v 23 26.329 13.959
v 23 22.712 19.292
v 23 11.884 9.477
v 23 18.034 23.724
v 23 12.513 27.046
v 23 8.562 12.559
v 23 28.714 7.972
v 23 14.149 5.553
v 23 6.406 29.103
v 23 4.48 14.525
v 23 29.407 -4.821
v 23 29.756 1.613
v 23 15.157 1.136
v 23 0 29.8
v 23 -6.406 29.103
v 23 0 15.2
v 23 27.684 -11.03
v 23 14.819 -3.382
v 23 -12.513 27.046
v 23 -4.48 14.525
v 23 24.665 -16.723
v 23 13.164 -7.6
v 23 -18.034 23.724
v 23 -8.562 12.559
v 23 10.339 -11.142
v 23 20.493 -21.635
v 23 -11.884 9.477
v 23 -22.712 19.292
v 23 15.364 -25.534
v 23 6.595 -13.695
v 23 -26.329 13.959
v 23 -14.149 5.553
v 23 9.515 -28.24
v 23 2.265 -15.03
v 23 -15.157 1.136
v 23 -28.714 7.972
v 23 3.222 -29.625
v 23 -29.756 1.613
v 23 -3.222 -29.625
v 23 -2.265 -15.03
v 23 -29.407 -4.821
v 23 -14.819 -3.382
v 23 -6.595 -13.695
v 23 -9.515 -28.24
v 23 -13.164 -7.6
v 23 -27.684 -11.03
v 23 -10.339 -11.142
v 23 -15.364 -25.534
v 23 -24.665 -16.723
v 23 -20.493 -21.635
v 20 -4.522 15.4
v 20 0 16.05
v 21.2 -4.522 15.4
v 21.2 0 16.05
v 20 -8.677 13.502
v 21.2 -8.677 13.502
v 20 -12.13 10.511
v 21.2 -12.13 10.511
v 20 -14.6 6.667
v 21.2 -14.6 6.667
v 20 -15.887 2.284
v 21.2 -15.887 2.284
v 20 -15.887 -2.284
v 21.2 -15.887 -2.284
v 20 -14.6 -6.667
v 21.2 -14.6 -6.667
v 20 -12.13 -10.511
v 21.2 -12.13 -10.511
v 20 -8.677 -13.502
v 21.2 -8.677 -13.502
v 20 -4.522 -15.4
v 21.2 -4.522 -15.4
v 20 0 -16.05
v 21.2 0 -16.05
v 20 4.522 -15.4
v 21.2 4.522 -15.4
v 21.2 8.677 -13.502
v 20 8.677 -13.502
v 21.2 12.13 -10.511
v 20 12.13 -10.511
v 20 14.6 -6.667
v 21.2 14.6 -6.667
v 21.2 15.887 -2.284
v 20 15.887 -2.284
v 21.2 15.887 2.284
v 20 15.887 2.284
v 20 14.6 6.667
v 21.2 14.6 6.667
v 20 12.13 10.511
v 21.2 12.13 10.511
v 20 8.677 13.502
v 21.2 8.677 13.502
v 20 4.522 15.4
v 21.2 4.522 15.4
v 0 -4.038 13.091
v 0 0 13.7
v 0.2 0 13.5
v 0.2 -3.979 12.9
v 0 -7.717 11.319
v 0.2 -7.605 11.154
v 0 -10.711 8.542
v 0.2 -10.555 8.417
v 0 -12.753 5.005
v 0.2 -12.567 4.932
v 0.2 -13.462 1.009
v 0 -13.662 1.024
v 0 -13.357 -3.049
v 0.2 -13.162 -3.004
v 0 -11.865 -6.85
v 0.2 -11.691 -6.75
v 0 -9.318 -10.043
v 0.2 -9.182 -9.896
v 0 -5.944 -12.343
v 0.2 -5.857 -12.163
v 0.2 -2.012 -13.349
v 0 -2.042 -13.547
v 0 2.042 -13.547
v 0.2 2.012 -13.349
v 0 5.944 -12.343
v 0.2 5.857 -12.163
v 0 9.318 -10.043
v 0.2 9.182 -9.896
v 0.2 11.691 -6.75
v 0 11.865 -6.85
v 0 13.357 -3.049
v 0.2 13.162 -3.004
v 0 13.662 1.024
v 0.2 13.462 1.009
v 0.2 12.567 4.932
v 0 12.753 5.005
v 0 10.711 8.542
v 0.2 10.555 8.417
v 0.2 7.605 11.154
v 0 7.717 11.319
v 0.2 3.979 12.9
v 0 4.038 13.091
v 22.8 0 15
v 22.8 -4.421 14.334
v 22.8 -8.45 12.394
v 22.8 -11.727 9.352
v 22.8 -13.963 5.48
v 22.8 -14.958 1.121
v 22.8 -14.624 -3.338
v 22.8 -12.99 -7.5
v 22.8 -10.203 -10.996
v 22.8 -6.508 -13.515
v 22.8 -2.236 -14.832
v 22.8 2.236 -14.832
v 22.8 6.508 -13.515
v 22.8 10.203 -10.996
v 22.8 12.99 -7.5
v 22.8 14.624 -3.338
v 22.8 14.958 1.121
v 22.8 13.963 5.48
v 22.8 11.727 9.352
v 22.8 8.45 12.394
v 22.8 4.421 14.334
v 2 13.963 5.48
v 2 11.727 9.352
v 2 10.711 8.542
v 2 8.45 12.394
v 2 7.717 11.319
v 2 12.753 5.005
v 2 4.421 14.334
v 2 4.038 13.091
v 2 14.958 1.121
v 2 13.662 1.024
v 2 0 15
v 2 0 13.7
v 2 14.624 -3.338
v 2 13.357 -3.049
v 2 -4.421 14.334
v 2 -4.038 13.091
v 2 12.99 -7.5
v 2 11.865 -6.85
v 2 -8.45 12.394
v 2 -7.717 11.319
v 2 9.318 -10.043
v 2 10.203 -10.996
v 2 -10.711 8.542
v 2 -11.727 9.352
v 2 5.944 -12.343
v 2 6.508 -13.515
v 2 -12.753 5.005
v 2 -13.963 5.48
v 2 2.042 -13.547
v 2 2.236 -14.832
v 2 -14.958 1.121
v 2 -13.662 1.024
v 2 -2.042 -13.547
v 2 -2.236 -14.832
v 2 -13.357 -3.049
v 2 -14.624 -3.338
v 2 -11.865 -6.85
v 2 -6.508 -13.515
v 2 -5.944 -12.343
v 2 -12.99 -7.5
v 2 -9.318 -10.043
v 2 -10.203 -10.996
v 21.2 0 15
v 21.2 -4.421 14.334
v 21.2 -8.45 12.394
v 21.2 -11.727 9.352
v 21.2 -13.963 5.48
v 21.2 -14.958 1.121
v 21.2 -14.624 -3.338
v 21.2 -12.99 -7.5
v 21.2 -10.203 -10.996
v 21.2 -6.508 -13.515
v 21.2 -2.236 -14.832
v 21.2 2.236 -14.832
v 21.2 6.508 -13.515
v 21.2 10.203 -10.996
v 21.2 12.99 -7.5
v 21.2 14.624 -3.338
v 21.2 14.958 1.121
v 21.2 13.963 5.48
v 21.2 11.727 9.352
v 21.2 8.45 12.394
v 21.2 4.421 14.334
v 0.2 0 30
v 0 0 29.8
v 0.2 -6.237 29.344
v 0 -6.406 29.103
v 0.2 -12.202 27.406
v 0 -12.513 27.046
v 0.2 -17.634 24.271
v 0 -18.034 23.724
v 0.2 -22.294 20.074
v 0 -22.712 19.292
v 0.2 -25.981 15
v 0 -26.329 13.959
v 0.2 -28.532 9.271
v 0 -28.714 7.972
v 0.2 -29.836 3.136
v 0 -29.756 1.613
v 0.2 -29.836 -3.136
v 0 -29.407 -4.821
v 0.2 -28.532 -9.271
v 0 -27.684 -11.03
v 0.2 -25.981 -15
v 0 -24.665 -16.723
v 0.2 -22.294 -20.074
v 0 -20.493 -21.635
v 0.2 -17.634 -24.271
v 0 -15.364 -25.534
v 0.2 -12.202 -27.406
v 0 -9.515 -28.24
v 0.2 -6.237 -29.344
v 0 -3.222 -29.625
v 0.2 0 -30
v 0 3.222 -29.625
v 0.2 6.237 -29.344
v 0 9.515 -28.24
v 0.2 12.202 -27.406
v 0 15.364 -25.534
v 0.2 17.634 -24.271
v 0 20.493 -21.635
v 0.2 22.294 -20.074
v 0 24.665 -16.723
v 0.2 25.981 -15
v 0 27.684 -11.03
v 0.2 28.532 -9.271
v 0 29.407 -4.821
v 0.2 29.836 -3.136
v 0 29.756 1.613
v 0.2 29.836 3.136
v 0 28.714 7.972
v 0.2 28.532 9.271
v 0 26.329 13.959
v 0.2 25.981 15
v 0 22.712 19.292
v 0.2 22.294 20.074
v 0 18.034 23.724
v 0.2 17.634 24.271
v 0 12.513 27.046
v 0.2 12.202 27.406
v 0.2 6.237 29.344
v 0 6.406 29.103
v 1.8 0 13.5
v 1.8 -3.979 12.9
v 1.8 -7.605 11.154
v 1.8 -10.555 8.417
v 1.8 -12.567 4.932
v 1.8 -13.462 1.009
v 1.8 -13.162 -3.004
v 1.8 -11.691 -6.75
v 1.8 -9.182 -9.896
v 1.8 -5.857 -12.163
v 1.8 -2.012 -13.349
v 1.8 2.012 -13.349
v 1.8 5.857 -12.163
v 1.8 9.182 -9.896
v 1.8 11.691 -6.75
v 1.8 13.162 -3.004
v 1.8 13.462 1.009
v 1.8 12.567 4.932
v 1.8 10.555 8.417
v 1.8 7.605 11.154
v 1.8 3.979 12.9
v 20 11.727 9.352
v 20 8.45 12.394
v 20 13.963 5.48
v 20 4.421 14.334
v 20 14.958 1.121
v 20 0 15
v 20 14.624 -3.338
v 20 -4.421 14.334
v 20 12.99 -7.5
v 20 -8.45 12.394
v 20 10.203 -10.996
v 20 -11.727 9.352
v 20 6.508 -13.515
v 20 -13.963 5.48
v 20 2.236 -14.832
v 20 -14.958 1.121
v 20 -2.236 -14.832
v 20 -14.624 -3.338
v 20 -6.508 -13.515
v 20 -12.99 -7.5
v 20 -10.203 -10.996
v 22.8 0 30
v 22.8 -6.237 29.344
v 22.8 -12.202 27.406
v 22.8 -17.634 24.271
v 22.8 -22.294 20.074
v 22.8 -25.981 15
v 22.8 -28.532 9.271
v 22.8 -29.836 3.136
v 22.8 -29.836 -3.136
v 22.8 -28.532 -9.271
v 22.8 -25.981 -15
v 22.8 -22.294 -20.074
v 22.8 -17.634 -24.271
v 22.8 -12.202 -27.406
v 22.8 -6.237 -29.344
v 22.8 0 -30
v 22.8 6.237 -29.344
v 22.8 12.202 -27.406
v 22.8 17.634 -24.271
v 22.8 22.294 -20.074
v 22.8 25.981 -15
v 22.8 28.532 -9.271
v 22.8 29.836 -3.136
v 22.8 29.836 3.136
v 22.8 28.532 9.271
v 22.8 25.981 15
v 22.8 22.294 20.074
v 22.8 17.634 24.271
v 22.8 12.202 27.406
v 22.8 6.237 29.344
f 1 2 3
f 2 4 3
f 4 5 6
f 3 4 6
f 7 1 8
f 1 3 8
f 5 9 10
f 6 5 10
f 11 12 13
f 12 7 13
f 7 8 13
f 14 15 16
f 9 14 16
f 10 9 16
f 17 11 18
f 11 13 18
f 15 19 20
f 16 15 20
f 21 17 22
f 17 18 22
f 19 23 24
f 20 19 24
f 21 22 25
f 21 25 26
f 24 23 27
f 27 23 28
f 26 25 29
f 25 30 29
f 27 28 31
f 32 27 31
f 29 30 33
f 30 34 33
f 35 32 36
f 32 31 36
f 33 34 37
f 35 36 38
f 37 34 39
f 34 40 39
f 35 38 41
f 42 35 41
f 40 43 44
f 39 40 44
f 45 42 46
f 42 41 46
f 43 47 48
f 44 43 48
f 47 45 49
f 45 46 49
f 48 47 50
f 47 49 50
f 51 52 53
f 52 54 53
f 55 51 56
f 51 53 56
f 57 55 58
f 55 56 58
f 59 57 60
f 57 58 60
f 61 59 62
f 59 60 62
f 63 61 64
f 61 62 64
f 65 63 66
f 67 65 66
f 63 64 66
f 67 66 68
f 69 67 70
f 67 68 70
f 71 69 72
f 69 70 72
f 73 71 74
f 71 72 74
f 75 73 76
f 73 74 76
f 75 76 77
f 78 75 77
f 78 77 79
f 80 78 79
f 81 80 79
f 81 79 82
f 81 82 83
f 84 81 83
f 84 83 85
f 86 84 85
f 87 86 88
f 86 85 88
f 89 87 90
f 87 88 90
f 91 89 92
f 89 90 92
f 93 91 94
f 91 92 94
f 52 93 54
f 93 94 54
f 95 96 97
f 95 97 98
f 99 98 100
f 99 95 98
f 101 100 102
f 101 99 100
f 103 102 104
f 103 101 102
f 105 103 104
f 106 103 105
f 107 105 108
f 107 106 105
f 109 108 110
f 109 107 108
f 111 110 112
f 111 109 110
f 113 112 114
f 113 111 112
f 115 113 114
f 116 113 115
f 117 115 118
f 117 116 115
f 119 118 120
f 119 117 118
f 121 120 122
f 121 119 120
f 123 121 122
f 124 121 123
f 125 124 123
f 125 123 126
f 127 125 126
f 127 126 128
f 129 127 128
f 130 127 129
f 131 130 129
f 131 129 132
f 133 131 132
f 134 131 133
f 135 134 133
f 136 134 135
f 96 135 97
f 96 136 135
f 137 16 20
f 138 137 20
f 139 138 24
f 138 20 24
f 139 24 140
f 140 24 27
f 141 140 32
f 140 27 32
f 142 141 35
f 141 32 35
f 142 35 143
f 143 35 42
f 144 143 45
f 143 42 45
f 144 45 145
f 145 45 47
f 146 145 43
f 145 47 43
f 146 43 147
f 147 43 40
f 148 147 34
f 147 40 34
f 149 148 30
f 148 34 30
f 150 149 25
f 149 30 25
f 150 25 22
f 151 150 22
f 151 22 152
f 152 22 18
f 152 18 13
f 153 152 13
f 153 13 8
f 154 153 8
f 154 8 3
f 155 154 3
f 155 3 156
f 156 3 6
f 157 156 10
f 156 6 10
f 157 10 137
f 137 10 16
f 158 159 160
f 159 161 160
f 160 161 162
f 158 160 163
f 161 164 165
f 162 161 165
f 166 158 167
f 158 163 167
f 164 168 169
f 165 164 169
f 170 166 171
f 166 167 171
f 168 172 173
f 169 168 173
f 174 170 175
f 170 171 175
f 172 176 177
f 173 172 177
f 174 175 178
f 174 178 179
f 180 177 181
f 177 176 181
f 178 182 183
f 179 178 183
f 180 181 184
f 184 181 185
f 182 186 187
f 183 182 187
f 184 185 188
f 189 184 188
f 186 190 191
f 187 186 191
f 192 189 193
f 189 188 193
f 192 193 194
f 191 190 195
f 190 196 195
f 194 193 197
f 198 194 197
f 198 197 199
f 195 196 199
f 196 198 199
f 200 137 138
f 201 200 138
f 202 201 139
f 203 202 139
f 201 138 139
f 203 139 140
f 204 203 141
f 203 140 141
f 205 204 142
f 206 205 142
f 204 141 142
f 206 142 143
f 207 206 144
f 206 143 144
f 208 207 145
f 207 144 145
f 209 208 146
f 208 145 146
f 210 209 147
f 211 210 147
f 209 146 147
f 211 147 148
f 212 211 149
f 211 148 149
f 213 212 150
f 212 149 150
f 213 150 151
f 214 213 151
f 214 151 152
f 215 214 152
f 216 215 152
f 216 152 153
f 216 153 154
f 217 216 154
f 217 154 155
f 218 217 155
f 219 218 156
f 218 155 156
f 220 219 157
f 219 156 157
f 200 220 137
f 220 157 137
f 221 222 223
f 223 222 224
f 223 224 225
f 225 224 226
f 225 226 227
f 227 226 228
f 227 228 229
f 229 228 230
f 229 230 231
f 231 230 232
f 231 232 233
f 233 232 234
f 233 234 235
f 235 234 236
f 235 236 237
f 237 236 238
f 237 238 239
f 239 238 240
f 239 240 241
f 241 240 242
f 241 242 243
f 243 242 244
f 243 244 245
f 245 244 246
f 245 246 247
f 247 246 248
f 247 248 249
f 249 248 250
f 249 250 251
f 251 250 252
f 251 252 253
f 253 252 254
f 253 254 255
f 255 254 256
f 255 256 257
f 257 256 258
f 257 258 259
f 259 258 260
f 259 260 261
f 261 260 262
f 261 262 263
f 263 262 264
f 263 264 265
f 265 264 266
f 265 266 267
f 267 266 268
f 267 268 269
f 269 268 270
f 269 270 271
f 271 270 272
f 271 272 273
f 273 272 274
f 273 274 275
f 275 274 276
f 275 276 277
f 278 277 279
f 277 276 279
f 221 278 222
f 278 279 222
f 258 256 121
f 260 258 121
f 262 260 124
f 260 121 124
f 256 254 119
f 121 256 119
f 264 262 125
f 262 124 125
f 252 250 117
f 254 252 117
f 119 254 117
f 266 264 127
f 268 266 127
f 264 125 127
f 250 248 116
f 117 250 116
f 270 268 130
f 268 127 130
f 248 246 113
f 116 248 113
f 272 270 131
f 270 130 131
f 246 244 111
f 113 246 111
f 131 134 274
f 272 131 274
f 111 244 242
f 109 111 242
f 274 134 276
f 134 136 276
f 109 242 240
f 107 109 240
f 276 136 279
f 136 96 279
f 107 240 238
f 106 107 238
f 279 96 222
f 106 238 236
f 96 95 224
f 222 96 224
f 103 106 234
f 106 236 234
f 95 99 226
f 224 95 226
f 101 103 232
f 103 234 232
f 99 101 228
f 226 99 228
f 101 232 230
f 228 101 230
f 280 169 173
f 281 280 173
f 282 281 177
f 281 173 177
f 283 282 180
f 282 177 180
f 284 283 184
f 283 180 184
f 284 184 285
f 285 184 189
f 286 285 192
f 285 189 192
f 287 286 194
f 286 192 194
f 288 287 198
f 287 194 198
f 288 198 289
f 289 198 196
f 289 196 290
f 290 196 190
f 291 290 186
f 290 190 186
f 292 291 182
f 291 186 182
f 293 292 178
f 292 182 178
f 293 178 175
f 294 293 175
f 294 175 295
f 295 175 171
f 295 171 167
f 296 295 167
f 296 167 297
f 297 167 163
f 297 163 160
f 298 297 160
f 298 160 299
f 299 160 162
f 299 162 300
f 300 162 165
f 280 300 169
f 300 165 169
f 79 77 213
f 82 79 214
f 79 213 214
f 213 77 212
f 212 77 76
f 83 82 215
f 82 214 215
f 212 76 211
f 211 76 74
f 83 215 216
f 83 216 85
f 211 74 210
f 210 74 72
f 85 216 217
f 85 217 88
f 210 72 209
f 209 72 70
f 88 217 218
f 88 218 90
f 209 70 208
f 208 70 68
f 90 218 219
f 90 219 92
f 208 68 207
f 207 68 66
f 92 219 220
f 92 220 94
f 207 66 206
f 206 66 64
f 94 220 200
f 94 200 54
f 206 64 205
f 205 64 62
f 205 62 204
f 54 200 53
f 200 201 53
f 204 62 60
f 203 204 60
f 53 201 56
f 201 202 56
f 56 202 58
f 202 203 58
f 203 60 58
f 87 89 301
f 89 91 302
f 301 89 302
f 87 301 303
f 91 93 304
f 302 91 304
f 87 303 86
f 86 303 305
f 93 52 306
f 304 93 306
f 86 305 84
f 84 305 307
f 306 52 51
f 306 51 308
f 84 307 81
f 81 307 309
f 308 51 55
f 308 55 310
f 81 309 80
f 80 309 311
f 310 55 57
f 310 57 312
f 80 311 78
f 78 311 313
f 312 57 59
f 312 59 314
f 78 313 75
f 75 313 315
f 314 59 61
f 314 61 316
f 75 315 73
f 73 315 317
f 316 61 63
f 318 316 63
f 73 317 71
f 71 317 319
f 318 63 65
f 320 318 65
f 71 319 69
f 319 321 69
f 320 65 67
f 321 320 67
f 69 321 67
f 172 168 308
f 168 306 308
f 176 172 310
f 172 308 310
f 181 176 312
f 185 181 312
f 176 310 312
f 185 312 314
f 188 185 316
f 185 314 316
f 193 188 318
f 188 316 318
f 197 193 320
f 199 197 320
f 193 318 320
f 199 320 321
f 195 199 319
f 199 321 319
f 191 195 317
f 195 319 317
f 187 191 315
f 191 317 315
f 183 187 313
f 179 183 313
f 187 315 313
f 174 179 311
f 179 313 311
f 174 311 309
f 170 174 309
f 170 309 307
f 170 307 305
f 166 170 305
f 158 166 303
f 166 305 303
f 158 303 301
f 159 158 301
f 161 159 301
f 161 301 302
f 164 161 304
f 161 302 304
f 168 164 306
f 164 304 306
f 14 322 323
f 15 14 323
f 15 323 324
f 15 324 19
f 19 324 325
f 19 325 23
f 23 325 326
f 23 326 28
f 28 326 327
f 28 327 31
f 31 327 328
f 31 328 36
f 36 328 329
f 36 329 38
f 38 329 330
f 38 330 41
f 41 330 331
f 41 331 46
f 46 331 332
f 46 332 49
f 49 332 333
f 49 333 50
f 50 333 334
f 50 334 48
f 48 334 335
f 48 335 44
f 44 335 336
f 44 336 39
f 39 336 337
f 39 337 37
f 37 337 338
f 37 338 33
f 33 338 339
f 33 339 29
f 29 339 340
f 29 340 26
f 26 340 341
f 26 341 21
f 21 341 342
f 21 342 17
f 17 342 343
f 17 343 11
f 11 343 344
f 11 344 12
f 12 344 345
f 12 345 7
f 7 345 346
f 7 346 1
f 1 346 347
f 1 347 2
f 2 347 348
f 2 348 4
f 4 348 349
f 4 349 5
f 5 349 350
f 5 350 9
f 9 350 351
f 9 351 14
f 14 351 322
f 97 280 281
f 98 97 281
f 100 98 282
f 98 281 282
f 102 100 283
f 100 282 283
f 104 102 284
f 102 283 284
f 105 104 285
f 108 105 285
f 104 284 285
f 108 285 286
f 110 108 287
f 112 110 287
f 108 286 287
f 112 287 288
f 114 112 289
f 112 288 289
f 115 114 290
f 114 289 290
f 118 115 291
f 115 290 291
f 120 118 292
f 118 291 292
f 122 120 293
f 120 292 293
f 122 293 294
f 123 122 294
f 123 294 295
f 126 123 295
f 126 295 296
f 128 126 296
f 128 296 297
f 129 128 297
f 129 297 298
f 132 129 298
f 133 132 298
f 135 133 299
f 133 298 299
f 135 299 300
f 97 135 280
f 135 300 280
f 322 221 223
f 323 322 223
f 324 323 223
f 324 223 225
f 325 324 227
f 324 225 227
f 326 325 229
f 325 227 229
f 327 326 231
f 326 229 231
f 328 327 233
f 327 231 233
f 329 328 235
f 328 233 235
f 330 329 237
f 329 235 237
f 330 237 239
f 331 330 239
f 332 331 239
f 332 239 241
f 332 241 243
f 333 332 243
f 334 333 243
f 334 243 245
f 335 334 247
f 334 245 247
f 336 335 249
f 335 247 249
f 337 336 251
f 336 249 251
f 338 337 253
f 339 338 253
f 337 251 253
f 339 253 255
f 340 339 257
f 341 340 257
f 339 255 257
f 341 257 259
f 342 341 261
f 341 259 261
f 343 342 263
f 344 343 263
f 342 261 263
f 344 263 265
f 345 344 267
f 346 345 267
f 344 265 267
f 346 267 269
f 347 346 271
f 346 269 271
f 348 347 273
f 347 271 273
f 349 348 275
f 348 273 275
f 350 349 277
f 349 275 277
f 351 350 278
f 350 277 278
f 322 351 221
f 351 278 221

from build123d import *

# Parameters (mm, degrees)
CHAMFER1_SIZE = 0.2


with BuildPart() as part:
    # Sketch1 → Revolve1 (revolve)
    with BuildSketch(Plane.XY, mode=Mode.PRIVATE) as revolve1_sk:
        Polygon((0, 13.5), (2, 13.5), (2, 15), (20, 15), (20, 16.05), (21.2, 16.05), (21.2, 15), (23, 15), (23, 30), (0, 30), align=None)
    revolve(revolve1_sk.sketch.rotate(Axis((0, 0, 0), (1, 0, 0)), 90), axis=Axis((0, 0, 0), (1, 0, 0)))

    # Chamfer1
    chamfer1_edges = [part.edges().sort_by_distance(p)[0] for p in [
        (2, 0, -13.5),
        (0, 0, -13.5),
        (0, 0, -30),
        (23, 0, -30),
        (23, 0, -15),
    ]]
    chamfer(chamfer1_edges, length=CHAMFER1_SIZE)


solid = part.part
